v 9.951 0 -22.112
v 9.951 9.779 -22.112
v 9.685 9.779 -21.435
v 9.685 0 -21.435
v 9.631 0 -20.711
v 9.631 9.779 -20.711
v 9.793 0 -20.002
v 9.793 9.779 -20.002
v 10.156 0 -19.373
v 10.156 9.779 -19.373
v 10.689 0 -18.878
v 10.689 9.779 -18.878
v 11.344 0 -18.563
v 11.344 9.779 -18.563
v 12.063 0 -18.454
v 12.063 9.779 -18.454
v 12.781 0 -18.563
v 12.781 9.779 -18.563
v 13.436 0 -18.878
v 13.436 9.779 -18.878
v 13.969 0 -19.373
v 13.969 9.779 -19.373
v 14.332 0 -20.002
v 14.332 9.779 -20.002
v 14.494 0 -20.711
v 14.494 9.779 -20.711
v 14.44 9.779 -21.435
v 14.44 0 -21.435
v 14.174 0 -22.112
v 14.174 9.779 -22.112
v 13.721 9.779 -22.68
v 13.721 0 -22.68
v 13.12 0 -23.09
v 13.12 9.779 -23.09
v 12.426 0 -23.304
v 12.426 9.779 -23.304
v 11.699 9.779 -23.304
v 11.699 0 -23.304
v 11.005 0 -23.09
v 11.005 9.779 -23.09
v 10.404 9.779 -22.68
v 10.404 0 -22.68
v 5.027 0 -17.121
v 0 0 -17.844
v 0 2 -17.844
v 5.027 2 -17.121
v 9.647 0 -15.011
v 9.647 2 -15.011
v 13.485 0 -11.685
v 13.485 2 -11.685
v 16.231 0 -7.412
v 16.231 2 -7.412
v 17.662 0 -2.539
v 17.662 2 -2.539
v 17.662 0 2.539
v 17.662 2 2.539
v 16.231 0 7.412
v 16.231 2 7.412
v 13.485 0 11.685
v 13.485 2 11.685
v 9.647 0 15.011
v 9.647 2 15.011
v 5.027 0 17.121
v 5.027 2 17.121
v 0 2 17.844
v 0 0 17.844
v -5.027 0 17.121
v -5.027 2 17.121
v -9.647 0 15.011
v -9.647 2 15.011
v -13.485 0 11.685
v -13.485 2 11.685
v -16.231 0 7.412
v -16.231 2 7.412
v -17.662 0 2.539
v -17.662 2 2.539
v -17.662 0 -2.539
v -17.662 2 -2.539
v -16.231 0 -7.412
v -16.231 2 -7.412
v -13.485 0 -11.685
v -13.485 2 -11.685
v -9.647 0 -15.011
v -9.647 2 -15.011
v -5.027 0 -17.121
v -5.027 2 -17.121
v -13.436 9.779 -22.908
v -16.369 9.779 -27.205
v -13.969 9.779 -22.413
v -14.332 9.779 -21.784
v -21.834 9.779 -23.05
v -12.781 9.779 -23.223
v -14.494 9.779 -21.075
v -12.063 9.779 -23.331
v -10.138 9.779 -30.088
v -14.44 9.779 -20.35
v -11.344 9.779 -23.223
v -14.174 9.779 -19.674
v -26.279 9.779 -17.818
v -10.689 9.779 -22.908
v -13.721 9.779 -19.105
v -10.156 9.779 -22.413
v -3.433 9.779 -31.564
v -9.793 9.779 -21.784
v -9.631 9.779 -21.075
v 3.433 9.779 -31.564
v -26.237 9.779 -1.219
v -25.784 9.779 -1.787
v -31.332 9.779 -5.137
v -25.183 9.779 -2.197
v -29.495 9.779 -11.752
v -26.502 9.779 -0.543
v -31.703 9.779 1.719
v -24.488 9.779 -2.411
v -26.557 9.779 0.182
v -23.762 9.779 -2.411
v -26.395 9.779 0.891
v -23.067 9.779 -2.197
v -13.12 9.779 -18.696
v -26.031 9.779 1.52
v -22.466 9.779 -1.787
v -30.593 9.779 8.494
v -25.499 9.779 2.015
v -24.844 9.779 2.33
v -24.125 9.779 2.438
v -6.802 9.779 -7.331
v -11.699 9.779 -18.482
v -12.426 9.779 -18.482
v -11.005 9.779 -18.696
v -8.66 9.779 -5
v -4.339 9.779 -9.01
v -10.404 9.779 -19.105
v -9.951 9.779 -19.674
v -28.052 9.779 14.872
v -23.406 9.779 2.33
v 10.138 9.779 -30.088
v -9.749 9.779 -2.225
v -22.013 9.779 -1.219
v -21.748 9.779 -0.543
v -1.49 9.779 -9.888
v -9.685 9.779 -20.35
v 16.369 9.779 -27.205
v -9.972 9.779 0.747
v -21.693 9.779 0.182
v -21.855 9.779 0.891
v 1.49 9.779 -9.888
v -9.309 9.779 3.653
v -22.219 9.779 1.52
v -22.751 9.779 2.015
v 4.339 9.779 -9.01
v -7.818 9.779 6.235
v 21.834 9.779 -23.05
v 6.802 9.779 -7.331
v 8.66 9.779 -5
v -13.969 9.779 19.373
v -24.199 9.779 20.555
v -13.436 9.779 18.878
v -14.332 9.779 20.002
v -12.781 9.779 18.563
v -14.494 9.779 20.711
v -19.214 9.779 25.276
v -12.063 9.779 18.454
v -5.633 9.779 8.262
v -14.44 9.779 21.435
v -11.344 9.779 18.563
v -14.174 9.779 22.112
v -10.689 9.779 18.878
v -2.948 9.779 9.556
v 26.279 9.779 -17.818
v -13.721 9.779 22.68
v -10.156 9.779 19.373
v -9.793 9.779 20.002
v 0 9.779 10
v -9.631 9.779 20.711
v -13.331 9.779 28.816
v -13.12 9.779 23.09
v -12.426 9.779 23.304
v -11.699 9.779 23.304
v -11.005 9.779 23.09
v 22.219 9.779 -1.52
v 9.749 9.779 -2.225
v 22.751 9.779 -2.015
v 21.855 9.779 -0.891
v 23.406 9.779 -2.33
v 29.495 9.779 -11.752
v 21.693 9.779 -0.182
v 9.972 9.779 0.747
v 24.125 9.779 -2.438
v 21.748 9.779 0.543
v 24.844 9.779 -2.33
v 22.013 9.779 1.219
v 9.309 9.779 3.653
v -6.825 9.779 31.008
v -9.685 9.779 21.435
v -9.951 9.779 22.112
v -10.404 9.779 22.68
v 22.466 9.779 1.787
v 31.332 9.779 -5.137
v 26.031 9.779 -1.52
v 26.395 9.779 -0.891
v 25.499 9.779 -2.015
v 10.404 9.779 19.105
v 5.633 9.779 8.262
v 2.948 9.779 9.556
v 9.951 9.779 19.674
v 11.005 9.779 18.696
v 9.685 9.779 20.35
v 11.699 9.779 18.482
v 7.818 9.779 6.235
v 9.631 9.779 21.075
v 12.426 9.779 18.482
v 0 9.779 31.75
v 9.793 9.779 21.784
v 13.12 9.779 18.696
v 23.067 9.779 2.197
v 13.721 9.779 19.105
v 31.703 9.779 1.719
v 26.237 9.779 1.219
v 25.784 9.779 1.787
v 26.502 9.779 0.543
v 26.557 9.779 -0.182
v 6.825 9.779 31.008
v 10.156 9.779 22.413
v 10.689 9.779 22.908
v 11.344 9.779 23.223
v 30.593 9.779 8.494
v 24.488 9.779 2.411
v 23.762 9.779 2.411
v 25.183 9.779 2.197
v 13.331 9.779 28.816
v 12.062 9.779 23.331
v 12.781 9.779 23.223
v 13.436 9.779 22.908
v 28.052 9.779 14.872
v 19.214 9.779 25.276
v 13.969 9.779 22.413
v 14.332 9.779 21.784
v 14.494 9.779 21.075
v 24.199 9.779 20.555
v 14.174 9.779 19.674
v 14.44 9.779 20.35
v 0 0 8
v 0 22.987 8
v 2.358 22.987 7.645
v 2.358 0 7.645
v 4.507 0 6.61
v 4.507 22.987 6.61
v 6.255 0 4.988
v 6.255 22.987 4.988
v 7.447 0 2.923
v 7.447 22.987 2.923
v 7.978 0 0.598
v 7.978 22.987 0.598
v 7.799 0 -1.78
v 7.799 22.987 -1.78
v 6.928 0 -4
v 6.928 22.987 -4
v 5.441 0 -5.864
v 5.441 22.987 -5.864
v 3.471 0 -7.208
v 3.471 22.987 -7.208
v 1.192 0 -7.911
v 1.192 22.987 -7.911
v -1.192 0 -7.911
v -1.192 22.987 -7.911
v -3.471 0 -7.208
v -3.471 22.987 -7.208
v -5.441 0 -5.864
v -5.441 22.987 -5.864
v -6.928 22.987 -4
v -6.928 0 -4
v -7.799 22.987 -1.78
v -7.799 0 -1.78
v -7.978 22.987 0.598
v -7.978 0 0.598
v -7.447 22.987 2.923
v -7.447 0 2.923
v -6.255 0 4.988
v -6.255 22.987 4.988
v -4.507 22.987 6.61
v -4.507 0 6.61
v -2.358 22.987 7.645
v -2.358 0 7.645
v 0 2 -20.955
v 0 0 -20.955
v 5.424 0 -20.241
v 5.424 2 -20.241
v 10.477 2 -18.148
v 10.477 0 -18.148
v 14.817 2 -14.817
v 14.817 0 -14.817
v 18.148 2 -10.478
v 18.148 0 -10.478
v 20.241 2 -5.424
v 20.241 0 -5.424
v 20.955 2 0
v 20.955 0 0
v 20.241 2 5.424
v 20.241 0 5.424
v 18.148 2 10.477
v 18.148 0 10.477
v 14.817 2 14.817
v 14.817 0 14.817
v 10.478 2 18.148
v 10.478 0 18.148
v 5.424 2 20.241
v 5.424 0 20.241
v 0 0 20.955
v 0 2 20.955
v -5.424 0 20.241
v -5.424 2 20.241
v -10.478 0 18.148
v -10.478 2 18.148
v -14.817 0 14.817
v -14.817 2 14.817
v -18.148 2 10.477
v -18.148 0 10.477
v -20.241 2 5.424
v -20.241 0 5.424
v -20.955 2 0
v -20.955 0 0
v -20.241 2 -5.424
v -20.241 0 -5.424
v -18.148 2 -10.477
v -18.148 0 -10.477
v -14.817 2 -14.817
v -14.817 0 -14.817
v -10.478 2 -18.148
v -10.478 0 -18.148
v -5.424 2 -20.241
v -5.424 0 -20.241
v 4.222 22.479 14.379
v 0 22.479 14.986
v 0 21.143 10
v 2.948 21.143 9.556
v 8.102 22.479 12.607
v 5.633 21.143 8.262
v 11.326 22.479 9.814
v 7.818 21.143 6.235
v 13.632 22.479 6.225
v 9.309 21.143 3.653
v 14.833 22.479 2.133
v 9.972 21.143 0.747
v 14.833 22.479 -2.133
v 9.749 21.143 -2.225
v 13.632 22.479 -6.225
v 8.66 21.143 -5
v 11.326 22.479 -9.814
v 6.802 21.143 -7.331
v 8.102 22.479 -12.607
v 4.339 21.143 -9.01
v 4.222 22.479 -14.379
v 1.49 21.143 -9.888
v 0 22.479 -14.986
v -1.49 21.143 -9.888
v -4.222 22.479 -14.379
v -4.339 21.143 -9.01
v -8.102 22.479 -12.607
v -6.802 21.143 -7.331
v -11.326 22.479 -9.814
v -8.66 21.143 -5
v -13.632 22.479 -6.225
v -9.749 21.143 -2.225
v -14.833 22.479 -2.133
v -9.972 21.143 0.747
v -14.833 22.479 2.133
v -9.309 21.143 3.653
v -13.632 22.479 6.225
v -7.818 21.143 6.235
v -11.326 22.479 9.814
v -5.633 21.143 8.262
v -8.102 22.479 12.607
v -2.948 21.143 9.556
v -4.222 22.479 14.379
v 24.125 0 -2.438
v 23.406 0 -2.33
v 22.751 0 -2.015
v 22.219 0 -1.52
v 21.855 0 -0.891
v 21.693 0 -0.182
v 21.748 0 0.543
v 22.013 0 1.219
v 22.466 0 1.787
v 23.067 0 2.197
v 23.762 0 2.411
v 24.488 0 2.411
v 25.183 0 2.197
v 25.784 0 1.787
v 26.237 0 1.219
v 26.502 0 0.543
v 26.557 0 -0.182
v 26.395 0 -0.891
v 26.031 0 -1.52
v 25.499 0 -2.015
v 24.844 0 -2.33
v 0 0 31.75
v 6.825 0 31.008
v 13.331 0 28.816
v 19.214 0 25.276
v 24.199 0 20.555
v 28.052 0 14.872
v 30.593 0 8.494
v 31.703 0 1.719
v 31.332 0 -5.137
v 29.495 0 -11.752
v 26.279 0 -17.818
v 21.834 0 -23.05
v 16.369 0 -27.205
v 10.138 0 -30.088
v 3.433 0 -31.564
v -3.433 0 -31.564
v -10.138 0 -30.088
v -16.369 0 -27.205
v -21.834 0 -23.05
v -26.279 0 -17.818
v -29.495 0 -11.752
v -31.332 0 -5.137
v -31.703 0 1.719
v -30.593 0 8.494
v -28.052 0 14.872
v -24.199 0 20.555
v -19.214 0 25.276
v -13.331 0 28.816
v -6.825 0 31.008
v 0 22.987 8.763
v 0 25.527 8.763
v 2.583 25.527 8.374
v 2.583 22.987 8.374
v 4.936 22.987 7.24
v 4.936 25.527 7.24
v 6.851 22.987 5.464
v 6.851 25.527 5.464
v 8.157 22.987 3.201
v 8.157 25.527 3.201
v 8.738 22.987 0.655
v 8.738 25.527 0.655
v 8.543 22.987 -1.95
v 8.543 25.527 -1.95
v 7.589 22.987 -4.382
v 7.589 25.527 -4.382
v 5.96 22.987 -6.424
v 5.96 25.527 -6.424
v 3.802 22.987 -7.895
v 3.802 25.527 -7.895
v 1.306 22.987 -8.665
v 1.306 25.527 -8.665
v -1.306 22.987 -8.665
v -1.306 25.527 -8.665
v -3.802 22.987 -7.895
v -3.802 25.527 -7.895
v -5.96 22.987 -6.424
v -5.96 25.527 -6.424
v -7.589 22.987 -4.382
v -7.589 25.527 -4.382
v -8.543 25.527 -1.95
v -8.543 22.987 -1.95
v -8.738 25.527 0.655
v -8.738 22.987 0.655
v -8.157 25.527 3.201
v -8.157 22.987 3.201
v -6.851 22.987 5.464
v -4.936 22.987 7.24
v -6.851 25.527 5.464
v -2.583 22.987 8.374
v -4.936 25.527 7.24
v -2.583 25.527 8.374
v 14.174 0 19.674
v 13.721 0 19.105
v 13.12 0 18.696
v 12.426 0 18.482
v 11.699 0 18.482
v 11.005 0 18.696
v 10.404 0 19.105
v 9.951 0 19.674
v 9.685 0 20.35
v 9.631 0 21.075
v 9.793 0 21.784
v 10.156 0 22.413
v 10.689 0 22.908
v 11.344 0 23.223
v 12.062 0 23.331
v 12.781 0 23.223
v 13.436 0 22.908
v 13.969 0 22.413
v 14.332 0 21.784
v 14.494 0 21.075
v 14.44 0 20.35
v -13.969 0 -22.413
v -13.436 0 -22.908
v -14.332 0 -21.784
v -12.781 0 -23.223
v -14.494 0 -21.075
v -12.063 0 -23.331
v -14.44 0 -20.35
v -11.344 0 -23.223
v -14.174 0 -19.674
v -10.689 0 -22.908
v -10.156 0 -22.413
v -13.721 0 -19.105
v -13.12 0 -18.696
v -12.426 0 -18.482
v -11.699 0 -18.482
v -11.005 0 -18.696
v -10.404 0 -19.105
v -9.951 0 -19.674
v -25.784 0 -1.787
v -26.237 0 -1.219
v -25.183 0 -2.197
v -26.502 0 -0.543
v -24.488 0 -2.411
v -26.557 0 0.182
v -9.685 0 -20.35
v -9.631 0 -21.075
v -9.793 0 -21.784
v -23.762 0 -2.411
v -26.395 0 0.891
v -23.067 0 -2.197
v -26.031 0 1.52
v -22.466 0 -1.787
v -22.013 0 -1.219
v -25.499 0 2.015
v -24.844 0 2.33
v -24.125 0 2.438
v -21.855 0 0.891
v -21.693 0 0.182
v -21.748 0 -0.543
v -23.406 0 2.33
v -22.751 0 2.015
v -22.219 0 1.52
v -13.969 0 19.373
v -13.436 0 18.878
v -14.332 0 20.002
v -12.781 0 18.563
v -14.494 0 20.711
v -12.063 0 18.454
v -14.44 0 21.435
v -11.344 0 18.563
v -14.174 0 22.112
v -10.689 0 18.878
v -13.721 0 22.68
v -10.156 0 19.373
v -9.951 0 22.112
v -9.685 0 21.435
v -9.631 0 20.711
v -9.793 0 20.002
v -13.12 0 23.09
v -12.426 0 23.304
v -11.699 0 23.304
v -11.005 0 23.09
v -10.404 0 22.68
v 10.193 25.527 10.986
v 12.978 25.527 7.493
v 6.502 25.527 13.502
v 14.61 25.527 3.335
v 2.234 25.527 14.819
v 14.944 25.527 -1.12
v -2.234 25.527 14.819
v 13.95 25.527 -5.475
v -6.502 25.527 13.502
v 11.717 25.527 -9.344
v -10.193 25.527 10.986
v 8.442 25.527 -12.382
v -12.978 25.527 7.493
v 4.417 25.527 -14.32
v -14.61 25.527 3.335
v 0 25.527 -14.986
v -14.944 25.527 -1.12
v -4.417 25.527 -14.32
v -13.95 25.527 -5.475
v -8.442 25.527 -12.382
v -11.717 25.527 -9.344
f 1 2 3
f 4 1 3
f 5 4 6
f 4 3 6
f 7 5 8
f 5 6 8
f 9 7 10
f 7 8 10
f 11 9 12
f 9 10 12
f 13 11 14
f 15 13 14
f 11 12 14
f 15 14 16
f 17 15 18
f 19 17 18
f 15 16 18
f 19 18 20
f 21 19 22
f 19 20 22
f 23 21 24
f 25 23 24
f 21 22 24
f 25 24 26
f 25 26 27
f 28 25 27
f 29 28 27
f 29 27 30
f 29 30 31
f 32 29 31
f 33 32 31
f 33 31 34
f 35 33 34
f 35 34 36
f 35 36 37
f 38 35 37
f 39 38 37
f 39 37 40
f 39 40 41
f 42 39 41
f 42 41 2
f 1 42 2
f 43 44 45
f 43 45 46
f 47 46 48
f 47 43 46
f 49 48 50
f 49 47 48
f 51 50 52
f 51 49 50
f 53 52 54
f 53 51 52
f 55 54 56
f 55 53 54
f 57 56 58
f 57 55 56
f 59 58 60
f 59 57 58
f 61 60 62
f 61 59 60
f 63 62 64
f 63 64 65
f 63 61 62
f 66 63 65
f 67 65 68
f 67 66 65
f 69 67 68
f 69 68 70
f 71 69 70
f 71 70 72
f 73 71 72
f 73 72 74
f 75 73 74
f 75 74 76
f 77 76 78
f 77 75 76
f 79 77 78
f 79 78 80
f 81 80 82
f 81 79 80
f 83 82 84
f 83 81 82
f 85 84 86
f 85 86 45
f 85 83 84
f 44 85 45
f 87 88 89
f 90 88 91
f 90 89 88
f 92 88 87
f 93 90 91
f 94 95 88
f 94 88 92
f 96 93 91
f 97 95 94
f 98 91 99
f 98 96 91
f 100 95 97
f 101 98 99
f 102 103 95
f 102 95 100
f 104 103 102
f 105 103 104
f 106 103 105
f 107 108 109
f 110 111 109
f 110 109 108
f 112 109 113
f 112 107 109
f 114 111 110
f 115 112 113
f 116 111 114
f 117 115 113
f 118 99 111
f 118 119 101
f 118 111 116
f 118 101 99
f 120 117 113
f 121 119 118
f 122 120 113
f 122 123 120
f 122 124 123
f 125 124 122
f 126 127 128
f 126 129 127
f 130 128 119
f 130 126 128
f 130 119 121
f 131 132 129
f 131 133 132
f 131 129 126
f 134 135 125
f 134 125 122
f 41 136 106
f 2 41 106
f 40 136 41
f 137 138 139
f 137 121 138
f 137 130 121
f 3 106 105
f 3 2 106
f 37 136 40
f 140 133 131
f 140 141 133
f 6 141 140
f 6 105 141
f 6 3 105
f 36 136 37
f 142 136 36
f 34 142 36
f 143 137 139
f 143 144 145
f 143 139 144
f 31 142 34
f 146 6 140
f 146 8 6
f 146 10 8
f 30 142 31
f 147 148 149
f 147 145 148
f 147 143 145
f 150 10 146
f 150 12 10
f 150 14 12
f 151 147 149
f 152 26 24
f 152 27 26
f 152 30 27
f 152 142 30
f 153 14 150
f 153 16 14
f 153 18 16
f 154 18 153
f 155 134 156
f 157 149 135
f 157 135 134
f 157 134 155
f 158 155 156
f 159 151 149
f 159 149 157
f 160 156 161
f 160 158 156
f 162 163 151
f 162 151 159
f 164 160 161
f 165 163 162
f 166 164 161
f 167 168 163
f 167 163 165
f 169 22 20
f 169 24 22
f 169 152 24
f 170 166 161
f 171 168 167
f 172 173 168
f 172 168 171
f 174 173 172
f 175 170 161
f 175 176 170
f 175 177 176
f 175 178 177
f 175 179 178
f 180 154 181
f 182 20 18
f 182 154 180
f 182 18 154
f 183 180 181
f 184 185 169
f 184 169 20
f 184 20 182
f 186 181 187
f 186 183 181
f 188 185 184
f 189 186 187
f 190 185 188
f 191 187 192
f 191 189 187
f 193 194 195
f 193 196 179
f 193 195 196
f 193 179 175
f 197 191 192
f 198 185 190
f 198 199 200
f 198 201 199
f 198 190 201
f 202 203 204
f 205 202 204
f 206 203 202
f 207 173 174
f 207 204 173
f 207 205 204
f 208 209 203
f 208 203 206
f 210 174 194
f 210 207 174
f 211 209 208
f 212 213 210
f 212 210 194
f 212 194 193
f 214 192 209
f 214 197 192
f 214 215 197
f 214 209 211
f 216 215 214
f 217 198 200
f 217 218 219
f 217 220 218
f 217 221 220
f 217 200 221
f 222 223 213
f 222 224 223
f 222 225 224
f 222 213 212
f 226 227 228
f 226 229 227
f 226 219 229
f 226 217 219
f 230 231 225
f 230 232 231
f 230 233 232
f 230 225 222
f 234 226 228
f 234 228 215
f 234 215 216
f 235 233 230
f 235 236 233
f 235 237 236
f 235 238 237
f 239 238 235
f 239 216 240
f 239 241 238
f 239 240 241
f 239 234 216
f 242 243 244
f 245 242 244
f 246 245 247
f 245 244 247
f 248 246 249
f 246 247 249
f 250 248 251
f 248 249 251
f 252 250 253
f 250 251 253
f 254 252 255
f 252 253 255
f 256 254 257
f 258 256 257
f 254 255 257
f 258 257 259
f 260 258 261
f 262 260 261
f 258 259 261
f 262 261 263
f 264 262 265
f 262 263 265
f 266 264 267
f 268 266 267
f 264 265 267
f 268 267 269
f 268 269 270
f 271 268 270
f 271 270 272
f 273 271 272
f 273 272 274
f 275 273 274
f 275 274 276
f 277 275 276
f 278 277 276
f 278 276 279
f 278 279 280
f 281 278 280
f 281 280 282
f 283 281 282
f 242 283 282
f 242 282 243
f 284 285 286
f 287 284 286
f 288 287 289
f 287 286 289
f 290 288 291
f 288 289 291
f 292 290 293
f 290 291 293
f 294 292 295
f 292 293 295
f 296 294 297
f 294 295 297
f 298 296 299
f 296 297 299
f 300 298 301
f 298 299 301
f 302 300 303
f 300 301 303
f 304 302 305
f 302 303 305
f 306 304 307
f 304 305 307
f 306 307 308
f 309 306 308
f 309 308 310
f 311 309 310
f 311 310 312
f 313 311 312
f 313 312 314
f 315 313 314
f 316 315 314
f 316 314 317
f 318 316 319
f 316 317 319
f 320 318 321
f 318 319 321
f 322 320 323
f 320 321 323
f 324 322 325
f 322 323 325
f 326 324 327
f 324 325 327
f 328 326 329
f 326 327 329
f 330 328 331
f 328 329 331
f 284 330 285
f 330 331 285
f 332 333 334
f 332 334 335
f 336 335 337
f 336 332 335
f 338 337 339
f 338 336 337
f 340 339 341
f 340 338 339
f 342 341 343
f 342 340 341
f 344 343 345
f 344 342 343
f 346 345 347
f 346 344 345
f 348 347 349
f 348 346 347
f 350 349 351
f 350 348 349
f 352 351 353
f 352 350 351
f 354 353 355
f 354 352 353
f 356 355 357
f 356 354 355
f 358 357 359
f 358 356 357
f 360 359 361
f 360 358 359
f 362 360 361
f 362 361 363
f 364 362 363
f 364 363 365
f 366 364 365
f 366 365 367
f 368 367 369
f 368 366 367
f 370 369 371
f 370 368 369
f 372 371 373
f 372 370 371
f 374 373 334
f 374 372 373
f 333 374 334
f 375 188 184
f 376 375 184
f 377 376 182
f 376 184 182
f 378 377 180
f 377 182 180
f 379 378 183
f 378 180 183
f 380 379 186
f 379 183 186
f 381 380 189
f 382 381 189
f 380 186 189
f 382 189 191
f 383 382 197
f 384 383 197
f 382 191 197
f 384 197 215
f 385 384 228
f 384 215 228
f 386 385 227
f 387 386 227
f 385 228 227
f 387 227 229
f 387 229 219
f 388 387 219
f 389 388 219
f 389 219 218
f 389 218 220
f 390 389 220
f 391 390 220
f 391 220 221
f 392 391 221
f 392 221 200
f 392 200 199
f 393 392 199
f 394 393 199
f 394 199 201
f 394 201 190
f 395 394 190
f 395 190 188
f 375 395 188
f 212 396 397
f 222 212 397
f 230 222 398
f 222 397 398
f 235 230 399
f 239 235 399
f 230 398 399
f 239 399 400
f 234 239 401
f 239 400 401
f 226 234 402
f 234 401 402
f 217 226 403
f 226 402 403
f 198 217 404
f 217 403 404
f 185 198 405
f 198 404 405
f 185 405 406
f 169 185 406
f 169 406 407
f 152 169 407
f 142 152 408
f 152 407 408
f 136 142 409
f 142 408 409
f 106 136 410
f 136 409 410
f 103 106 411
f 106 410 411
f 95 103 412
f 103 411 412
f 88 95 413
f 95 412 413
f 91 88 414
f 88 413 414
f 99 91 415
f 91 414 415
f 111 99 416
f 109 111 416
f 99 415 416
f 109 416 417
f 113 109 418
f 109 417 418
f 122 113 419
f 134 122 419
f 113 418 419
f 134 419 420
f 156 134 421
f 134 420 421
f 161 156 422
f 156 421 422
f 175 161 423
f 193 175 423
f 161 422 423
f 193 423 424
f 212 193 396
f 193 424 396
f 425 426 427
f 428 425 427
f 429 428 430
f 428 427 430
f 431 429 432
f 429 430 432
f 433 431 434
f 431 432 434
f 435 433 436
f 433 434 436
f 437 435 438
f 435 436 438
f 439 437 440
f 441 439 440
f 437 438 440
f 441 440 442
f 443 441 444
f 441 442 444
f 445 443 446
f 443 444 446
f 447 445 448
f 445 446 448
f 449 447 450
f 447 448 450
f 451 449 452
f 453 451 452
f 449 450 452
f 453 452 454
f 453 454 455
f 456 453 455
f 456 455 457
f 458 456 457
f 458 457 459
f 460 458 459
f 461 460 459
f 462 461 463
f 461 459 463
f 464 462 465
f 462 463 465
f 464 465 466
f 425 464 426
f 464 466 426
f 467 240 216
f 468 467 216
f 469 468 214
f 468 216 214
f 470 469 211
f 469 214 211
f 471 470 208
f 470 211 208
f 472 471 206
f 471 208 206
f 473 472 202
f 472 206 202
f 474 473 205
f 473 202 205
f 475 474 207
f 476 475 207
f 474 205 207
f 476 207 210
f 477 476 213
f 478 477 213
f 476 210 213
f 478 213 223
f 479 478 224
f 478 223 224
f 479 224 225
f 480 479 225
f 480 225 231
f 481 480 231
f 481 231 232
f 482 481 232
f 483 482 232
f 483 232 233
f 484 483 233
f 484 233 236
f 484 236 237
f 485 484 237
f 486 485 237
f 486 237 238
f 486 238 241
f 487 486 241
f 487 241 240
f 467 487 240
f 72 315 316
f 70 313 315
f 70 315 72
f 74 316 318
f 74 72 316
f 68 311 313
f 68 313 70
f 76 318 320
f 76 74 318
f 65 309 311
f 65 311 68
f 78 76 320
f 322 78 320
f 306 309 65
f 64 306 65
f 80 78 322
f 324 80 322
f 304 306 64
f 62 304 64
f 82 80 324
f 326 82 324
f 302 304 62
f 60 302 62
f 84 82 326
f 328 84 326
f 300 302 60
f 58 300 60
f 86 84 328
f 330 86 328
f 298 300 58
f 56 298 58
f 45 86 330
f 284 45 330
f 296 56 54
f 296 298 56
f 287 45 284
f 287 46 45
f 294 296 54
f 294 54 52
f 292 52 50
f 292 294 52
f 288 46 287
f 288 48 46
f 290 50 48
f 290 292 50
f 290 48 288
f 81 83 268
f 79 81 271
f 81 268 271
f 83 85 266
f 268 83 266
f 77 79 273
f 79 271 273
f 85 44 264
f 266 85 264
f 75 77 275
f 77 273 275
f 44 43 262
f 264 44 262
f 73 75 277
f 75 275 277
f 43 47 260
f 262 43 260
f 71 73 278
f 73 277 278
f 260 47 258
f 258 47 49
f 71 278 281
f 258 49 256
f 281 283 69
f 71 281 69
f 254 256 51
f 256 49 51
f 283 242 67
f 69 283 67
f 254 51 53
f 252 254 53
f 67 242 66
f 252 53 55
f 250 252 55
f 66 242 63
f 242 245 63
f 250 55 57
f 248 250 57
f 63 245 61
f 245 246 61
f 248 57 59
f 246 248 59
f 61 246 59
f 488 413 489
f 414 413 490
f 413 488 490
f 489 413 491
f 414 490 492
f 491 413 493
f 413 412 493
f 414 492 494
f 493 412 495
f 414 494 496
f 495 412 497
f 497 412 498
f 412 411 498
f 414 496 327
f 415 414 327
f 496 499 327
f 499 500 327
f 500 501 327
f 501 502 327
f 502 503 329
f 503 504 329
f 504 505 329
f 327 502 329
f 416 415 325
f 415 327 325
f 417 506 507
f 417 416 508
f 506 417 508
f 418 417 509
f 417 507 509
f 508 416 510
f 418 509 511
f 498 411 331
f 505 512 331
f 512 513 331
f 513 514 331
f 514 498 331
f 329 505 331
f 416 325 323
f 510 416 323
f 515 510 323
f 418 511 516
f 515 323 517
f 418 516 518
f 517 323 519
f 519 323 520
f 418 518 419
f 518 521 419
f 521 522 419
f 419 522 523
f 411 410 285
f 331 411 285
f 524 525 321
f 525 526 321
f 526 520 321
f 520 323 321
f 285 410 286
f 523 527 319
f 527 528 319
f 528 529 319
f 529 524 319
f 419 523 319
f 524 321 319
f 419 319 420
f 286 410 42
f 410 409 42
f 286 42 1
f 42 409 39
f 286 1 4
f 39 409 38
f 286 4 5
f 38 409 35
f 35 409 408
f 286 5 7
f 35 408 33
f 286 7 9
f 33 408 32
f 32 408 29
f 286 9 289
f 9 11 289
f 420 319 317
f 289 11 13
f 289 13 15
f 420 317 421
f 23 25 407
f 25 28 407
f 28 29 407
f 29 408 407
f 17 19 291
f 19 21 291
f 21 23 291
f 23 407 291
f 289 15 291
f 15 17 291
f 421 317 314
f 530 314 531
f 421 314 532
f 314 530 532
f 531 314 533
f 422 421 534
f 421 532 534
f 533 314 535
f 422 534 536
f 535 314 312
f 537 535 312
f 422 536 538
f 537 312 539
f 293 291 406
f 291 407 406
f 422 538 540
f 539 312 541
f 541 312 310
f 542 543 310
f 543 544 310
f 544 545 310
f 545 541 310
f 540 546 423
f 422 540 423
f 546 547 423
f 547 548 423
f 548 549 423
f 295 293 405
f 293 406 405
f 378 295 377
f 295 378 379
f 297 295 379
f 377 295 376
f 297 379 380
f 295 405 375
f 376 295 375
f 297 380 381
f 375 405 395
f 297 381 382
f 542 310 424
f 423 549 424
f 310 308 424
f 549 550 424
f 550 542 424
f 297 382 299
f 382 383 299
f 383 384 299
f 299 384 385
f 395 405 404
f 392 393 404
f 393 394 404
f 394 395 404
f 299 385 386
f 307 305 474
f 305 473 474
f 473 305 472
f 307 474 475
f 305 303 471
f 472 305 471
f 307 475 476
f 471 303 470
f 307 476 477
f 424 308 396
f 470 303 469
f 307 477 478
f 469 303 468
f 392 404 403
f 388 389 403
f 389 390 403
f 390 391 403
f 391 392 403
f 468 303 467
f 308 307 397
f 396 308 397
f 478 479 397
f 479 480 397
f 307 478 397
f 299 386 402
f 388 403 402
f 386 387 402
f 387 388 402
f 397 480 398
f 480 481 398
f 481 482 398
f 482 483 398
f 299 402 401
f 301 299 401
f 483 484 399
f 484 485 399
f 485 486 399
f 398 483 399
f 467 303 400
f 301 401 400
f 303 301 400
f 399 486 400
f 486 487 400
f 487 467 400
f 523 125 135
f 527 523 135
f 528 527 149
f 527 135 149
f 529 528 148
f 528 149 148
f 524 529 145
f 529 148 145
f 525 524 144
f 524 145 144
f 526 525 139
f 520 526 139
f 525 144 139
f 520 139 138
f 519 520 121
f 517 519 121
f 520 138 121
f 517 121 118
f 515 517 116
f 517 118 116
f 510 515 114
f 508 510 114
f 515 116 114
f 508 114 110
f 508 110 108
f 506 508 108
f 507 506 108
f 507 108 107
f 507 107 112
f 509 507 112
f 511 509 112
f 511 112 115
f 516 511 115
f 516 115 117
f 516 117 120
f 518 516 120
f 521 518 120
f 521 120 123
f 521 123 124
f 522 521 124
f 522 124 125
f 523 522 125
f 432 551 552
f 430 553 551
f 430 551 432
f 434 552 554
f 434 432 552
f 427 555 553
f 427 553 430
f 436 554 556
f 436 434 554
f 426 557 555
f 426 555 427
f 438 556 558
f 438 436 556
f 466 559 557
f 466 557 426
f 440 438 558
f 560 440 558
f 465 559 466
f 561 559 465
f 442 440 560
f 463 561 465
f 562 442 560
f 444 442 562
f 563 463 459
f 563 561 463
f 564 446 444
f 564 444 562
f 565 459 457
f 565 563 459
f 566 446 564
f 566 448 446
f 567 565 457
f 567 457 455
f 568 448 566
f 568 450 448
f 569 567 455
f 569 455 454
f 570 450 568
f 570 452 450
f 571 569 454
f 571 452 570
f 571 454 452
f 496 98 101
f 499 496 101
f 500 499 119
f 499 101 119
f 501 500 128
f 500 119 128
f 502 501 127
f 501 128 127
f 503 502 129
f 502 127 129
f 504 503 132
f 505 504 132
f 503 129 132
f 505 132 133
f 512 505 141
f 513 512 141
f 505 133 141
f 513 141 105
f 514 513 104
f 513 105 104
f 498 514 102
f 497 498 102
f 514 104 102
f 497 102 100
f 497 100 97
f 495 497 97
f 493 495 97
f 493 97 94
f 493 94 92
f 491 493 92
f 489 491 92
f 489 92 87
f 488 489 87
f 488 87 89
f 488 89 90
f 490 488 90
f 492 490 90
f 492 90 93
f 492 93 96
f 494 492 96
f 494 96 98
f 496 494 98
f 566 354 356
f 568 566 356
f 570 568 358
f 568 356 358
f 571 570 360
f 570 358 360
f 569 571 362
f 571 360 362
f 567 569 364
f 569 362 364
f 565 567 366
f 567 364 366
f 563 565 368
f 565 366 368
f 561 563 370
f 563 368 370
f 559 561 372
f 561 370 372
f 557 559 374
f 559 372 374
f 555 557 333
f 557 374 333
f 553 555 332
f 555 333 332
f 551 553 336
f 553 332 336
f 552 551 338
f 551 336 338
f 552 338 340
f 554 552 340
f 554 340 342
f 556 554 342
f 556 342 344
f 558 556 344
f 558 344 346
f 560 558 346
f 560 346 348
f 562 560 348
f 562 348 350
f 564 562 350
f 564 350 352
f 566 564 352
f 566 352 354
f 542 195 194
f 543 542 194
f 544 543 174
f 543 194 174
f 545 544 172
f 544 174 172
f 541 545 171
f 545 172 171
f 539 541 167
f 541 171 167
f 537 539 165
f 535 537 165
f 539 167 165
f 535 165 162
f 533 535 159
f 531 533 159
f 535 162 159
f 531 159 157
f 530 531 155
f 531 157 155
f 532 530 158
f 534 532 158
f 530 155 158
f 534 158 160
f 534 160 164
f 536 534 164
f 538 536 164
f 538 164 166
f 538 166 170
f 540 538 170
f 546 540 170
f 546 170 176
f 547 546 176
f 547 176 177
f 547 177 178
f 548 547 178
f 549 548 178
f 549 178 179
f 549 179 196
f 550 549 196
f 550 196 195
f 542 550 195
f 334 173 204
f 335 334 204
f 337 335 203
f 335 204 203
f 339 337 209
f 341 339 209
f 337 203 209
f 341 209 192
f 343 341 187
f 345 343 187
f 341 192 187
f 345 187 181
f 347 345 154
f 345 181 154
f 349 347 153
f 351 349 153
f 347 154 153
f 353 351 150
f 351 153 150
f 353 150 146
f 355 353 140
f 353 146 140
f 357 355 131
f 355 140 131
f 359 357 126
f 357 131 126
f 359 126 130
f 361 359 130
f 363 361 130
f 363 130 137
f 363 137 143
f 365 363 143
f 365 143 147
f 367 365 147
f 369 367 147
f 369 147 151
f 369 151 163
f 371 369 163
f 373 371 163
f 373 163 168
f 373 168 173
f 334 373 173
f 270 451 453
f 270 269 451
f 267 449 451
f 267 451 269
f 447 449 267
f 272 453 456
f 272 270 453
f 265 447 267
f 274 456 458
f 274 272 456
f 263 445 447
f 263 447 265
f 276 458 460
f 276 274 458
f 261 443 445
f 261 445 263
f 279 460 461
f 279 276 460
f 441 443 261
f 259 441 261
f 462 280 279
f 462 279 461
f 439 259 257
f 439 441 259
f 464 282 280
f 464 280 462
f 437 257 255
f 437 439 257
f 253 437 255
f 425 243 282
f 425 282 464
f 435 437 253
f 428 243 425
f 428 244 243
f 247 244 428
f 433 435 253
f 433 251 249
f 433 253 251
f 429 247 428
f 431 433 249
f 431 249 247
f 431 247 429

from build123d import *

# Parameters (mm, degrees)
SKETCH1_R           = 31.75
BOSS_EXTRUDE1_DEPTH = 9.779
SKETCH2_R           = 2.4384
CUT_EXTRUDE1_DEPTH  = 46.95382292
CIRPATTERN1_COUNT   = 6
SKETCH3_R           = 20.955
SKETCH3_R_2         = 17.8435
CUT_EXTRUDE2_DEPTH  = 2
SKETCH4_R           = 10
SKETCH4_R_2         = 8
BOSS_EXTRUDE2_DEPTH = 12.7
SKETCH5_R           = 14.986
BOSS_EXTRUDE3_DEPTH = 3.048
SKETCH6_R           = 8.763
CUT_EXTRUDE3_DEPTH  = 2.54
SKETCH8_R           = 8
CUT_EXTRUDE4_DEPTH  = 51.443306484


with BuildPart() as part:
    # Sketch1 → Boss-Extrude1 (new body)
    with BuildSketch(Plane(origin=(0, 0, 0), x_dir=(1, 0, 0), z_dir=(0, 1, 0))):
        with Locations(Location((0, 0, 0), (0, 0, 270))):
            Circle(SKETCH1_R)
    extrude(amount=BOSS_EXTRUDE1_DEPTH)

    # Sketch2 → Cut-Extrude1 (cut, through all)
    with BuildSketch(Plane(origin=(0, 9.779, 0), x_dir=(1, 0, 0), z_dir=(0, 1, 0))):
        with Locations(Location((-24.125, 0, 0), (0, 0, 270))):
            Circle(SKETCH2_R)
    cut_extrude1 = extrude(amount=-CUT_EXTRUDE1_DEPTH, mode=Mode.SUBTRACT)

    # CirPattern1: Cut-Extrude1 ×6 about axis
    cirpattern1_axis = Axis((0, 0, 0), (0, 1, 0))
    for i in range(1, CIRPATTERN1_COUNT):
        add(cut_extrude1.rotate(cirpattern1_axis, i * 360 / CIRPATTERN1_COUNT), mode=Mode.SUBTRACT)

    # Sketch3 → Cut-Extrude2 (cut)
    with BuildSketch(Plane.XZ):
        with Locations(Location((0, 0, 0), (0, 0, 270))):
            Circle(SKETCH3_R)
        with Locations(Location((0, 0, 0), (0, 0, 270))):
            Circle(SKETCH3_R_2, mode=Mode.SUBTRACT)
    extrude(amount=-CUT_EXTRUDE2_DEPTH, mode=Mode.SUBTRACT)

    # Sketch4 → Boss-Extrude2 (add)
    with BuildSketch(Plane(origin=(0, 9.779, 0), x_dir=(1, 0, 0), z_dir=(0, 1, 0))):
        with Locations(Location((0, 0, 0), (0, 0, 270))):
            Circle(SKETCH4_R)
        with Locations(Location((0, 0, 0), (0, 0, 270))):
            Circle(SKETCH4_R_2, mode=Mode.SUBTRACT)
    extrude(amount=BOSS_EXTRUDE2_DEPTH)

    # Sketch5 → Boss-Extrude3 (add)
    with BuildSketch(Plane(origin=(0, 22.479, 0), x_dir=(1, 0, 0), z_dir=(0, 1, 0))):
        with Locations(Location((0, 0, 0), (0, 0, 90))):
            Circle(SKETCH5_R)
    extrude(amount=BOSS_EXTRUDE3_DEPTH)

    # Sketch6 → Cut-Extrude3 (cut)
    with BuildSketch(Plane(origin=(0, 25.527, 0), x_dir=(1, 0, 0), z_dir=(0, 1, 0))):
        with Locations(Location((0, 0, 0), (0, 0, 270))):
            Circle(SKETCH6_R)
    extrude(amount=-CUT_EXTRUDE3_DEPTH, mode=Mode.SUBTRACT)

    # Sketch7 → Revolve1 (revolve)
    with BuildSketch(Plane.XY, mode=Mode.PRIVATE) as revolve1_sk:
        Polygon((-14.986, 22.479), (-10, 22.479), (-10, 21.143005327), align=None)
    revolve(revolve1_sk.sketch.rotate(Axis((0, 0, 0), (0, 1, 0)), 90), axis=Axis((0, 0, 0), (0, 1, 0)))

    # Sketch8 → Cut-Extrude4 (cut, through all)
    with BuildSketch(Plane(origin=(0, 22.987, 0), x_dir=(1, 0, 0), z_dir=(0, 1, 0))):
        with Locations(Location((0, 0, 0), (0, 0, 270))):
            Circle(SKETCH8_R)
    extrude(amount=-CUT_EXTRUDE4_DEPTH, mode=Mode.SUBTRACT)


solid = part.part
